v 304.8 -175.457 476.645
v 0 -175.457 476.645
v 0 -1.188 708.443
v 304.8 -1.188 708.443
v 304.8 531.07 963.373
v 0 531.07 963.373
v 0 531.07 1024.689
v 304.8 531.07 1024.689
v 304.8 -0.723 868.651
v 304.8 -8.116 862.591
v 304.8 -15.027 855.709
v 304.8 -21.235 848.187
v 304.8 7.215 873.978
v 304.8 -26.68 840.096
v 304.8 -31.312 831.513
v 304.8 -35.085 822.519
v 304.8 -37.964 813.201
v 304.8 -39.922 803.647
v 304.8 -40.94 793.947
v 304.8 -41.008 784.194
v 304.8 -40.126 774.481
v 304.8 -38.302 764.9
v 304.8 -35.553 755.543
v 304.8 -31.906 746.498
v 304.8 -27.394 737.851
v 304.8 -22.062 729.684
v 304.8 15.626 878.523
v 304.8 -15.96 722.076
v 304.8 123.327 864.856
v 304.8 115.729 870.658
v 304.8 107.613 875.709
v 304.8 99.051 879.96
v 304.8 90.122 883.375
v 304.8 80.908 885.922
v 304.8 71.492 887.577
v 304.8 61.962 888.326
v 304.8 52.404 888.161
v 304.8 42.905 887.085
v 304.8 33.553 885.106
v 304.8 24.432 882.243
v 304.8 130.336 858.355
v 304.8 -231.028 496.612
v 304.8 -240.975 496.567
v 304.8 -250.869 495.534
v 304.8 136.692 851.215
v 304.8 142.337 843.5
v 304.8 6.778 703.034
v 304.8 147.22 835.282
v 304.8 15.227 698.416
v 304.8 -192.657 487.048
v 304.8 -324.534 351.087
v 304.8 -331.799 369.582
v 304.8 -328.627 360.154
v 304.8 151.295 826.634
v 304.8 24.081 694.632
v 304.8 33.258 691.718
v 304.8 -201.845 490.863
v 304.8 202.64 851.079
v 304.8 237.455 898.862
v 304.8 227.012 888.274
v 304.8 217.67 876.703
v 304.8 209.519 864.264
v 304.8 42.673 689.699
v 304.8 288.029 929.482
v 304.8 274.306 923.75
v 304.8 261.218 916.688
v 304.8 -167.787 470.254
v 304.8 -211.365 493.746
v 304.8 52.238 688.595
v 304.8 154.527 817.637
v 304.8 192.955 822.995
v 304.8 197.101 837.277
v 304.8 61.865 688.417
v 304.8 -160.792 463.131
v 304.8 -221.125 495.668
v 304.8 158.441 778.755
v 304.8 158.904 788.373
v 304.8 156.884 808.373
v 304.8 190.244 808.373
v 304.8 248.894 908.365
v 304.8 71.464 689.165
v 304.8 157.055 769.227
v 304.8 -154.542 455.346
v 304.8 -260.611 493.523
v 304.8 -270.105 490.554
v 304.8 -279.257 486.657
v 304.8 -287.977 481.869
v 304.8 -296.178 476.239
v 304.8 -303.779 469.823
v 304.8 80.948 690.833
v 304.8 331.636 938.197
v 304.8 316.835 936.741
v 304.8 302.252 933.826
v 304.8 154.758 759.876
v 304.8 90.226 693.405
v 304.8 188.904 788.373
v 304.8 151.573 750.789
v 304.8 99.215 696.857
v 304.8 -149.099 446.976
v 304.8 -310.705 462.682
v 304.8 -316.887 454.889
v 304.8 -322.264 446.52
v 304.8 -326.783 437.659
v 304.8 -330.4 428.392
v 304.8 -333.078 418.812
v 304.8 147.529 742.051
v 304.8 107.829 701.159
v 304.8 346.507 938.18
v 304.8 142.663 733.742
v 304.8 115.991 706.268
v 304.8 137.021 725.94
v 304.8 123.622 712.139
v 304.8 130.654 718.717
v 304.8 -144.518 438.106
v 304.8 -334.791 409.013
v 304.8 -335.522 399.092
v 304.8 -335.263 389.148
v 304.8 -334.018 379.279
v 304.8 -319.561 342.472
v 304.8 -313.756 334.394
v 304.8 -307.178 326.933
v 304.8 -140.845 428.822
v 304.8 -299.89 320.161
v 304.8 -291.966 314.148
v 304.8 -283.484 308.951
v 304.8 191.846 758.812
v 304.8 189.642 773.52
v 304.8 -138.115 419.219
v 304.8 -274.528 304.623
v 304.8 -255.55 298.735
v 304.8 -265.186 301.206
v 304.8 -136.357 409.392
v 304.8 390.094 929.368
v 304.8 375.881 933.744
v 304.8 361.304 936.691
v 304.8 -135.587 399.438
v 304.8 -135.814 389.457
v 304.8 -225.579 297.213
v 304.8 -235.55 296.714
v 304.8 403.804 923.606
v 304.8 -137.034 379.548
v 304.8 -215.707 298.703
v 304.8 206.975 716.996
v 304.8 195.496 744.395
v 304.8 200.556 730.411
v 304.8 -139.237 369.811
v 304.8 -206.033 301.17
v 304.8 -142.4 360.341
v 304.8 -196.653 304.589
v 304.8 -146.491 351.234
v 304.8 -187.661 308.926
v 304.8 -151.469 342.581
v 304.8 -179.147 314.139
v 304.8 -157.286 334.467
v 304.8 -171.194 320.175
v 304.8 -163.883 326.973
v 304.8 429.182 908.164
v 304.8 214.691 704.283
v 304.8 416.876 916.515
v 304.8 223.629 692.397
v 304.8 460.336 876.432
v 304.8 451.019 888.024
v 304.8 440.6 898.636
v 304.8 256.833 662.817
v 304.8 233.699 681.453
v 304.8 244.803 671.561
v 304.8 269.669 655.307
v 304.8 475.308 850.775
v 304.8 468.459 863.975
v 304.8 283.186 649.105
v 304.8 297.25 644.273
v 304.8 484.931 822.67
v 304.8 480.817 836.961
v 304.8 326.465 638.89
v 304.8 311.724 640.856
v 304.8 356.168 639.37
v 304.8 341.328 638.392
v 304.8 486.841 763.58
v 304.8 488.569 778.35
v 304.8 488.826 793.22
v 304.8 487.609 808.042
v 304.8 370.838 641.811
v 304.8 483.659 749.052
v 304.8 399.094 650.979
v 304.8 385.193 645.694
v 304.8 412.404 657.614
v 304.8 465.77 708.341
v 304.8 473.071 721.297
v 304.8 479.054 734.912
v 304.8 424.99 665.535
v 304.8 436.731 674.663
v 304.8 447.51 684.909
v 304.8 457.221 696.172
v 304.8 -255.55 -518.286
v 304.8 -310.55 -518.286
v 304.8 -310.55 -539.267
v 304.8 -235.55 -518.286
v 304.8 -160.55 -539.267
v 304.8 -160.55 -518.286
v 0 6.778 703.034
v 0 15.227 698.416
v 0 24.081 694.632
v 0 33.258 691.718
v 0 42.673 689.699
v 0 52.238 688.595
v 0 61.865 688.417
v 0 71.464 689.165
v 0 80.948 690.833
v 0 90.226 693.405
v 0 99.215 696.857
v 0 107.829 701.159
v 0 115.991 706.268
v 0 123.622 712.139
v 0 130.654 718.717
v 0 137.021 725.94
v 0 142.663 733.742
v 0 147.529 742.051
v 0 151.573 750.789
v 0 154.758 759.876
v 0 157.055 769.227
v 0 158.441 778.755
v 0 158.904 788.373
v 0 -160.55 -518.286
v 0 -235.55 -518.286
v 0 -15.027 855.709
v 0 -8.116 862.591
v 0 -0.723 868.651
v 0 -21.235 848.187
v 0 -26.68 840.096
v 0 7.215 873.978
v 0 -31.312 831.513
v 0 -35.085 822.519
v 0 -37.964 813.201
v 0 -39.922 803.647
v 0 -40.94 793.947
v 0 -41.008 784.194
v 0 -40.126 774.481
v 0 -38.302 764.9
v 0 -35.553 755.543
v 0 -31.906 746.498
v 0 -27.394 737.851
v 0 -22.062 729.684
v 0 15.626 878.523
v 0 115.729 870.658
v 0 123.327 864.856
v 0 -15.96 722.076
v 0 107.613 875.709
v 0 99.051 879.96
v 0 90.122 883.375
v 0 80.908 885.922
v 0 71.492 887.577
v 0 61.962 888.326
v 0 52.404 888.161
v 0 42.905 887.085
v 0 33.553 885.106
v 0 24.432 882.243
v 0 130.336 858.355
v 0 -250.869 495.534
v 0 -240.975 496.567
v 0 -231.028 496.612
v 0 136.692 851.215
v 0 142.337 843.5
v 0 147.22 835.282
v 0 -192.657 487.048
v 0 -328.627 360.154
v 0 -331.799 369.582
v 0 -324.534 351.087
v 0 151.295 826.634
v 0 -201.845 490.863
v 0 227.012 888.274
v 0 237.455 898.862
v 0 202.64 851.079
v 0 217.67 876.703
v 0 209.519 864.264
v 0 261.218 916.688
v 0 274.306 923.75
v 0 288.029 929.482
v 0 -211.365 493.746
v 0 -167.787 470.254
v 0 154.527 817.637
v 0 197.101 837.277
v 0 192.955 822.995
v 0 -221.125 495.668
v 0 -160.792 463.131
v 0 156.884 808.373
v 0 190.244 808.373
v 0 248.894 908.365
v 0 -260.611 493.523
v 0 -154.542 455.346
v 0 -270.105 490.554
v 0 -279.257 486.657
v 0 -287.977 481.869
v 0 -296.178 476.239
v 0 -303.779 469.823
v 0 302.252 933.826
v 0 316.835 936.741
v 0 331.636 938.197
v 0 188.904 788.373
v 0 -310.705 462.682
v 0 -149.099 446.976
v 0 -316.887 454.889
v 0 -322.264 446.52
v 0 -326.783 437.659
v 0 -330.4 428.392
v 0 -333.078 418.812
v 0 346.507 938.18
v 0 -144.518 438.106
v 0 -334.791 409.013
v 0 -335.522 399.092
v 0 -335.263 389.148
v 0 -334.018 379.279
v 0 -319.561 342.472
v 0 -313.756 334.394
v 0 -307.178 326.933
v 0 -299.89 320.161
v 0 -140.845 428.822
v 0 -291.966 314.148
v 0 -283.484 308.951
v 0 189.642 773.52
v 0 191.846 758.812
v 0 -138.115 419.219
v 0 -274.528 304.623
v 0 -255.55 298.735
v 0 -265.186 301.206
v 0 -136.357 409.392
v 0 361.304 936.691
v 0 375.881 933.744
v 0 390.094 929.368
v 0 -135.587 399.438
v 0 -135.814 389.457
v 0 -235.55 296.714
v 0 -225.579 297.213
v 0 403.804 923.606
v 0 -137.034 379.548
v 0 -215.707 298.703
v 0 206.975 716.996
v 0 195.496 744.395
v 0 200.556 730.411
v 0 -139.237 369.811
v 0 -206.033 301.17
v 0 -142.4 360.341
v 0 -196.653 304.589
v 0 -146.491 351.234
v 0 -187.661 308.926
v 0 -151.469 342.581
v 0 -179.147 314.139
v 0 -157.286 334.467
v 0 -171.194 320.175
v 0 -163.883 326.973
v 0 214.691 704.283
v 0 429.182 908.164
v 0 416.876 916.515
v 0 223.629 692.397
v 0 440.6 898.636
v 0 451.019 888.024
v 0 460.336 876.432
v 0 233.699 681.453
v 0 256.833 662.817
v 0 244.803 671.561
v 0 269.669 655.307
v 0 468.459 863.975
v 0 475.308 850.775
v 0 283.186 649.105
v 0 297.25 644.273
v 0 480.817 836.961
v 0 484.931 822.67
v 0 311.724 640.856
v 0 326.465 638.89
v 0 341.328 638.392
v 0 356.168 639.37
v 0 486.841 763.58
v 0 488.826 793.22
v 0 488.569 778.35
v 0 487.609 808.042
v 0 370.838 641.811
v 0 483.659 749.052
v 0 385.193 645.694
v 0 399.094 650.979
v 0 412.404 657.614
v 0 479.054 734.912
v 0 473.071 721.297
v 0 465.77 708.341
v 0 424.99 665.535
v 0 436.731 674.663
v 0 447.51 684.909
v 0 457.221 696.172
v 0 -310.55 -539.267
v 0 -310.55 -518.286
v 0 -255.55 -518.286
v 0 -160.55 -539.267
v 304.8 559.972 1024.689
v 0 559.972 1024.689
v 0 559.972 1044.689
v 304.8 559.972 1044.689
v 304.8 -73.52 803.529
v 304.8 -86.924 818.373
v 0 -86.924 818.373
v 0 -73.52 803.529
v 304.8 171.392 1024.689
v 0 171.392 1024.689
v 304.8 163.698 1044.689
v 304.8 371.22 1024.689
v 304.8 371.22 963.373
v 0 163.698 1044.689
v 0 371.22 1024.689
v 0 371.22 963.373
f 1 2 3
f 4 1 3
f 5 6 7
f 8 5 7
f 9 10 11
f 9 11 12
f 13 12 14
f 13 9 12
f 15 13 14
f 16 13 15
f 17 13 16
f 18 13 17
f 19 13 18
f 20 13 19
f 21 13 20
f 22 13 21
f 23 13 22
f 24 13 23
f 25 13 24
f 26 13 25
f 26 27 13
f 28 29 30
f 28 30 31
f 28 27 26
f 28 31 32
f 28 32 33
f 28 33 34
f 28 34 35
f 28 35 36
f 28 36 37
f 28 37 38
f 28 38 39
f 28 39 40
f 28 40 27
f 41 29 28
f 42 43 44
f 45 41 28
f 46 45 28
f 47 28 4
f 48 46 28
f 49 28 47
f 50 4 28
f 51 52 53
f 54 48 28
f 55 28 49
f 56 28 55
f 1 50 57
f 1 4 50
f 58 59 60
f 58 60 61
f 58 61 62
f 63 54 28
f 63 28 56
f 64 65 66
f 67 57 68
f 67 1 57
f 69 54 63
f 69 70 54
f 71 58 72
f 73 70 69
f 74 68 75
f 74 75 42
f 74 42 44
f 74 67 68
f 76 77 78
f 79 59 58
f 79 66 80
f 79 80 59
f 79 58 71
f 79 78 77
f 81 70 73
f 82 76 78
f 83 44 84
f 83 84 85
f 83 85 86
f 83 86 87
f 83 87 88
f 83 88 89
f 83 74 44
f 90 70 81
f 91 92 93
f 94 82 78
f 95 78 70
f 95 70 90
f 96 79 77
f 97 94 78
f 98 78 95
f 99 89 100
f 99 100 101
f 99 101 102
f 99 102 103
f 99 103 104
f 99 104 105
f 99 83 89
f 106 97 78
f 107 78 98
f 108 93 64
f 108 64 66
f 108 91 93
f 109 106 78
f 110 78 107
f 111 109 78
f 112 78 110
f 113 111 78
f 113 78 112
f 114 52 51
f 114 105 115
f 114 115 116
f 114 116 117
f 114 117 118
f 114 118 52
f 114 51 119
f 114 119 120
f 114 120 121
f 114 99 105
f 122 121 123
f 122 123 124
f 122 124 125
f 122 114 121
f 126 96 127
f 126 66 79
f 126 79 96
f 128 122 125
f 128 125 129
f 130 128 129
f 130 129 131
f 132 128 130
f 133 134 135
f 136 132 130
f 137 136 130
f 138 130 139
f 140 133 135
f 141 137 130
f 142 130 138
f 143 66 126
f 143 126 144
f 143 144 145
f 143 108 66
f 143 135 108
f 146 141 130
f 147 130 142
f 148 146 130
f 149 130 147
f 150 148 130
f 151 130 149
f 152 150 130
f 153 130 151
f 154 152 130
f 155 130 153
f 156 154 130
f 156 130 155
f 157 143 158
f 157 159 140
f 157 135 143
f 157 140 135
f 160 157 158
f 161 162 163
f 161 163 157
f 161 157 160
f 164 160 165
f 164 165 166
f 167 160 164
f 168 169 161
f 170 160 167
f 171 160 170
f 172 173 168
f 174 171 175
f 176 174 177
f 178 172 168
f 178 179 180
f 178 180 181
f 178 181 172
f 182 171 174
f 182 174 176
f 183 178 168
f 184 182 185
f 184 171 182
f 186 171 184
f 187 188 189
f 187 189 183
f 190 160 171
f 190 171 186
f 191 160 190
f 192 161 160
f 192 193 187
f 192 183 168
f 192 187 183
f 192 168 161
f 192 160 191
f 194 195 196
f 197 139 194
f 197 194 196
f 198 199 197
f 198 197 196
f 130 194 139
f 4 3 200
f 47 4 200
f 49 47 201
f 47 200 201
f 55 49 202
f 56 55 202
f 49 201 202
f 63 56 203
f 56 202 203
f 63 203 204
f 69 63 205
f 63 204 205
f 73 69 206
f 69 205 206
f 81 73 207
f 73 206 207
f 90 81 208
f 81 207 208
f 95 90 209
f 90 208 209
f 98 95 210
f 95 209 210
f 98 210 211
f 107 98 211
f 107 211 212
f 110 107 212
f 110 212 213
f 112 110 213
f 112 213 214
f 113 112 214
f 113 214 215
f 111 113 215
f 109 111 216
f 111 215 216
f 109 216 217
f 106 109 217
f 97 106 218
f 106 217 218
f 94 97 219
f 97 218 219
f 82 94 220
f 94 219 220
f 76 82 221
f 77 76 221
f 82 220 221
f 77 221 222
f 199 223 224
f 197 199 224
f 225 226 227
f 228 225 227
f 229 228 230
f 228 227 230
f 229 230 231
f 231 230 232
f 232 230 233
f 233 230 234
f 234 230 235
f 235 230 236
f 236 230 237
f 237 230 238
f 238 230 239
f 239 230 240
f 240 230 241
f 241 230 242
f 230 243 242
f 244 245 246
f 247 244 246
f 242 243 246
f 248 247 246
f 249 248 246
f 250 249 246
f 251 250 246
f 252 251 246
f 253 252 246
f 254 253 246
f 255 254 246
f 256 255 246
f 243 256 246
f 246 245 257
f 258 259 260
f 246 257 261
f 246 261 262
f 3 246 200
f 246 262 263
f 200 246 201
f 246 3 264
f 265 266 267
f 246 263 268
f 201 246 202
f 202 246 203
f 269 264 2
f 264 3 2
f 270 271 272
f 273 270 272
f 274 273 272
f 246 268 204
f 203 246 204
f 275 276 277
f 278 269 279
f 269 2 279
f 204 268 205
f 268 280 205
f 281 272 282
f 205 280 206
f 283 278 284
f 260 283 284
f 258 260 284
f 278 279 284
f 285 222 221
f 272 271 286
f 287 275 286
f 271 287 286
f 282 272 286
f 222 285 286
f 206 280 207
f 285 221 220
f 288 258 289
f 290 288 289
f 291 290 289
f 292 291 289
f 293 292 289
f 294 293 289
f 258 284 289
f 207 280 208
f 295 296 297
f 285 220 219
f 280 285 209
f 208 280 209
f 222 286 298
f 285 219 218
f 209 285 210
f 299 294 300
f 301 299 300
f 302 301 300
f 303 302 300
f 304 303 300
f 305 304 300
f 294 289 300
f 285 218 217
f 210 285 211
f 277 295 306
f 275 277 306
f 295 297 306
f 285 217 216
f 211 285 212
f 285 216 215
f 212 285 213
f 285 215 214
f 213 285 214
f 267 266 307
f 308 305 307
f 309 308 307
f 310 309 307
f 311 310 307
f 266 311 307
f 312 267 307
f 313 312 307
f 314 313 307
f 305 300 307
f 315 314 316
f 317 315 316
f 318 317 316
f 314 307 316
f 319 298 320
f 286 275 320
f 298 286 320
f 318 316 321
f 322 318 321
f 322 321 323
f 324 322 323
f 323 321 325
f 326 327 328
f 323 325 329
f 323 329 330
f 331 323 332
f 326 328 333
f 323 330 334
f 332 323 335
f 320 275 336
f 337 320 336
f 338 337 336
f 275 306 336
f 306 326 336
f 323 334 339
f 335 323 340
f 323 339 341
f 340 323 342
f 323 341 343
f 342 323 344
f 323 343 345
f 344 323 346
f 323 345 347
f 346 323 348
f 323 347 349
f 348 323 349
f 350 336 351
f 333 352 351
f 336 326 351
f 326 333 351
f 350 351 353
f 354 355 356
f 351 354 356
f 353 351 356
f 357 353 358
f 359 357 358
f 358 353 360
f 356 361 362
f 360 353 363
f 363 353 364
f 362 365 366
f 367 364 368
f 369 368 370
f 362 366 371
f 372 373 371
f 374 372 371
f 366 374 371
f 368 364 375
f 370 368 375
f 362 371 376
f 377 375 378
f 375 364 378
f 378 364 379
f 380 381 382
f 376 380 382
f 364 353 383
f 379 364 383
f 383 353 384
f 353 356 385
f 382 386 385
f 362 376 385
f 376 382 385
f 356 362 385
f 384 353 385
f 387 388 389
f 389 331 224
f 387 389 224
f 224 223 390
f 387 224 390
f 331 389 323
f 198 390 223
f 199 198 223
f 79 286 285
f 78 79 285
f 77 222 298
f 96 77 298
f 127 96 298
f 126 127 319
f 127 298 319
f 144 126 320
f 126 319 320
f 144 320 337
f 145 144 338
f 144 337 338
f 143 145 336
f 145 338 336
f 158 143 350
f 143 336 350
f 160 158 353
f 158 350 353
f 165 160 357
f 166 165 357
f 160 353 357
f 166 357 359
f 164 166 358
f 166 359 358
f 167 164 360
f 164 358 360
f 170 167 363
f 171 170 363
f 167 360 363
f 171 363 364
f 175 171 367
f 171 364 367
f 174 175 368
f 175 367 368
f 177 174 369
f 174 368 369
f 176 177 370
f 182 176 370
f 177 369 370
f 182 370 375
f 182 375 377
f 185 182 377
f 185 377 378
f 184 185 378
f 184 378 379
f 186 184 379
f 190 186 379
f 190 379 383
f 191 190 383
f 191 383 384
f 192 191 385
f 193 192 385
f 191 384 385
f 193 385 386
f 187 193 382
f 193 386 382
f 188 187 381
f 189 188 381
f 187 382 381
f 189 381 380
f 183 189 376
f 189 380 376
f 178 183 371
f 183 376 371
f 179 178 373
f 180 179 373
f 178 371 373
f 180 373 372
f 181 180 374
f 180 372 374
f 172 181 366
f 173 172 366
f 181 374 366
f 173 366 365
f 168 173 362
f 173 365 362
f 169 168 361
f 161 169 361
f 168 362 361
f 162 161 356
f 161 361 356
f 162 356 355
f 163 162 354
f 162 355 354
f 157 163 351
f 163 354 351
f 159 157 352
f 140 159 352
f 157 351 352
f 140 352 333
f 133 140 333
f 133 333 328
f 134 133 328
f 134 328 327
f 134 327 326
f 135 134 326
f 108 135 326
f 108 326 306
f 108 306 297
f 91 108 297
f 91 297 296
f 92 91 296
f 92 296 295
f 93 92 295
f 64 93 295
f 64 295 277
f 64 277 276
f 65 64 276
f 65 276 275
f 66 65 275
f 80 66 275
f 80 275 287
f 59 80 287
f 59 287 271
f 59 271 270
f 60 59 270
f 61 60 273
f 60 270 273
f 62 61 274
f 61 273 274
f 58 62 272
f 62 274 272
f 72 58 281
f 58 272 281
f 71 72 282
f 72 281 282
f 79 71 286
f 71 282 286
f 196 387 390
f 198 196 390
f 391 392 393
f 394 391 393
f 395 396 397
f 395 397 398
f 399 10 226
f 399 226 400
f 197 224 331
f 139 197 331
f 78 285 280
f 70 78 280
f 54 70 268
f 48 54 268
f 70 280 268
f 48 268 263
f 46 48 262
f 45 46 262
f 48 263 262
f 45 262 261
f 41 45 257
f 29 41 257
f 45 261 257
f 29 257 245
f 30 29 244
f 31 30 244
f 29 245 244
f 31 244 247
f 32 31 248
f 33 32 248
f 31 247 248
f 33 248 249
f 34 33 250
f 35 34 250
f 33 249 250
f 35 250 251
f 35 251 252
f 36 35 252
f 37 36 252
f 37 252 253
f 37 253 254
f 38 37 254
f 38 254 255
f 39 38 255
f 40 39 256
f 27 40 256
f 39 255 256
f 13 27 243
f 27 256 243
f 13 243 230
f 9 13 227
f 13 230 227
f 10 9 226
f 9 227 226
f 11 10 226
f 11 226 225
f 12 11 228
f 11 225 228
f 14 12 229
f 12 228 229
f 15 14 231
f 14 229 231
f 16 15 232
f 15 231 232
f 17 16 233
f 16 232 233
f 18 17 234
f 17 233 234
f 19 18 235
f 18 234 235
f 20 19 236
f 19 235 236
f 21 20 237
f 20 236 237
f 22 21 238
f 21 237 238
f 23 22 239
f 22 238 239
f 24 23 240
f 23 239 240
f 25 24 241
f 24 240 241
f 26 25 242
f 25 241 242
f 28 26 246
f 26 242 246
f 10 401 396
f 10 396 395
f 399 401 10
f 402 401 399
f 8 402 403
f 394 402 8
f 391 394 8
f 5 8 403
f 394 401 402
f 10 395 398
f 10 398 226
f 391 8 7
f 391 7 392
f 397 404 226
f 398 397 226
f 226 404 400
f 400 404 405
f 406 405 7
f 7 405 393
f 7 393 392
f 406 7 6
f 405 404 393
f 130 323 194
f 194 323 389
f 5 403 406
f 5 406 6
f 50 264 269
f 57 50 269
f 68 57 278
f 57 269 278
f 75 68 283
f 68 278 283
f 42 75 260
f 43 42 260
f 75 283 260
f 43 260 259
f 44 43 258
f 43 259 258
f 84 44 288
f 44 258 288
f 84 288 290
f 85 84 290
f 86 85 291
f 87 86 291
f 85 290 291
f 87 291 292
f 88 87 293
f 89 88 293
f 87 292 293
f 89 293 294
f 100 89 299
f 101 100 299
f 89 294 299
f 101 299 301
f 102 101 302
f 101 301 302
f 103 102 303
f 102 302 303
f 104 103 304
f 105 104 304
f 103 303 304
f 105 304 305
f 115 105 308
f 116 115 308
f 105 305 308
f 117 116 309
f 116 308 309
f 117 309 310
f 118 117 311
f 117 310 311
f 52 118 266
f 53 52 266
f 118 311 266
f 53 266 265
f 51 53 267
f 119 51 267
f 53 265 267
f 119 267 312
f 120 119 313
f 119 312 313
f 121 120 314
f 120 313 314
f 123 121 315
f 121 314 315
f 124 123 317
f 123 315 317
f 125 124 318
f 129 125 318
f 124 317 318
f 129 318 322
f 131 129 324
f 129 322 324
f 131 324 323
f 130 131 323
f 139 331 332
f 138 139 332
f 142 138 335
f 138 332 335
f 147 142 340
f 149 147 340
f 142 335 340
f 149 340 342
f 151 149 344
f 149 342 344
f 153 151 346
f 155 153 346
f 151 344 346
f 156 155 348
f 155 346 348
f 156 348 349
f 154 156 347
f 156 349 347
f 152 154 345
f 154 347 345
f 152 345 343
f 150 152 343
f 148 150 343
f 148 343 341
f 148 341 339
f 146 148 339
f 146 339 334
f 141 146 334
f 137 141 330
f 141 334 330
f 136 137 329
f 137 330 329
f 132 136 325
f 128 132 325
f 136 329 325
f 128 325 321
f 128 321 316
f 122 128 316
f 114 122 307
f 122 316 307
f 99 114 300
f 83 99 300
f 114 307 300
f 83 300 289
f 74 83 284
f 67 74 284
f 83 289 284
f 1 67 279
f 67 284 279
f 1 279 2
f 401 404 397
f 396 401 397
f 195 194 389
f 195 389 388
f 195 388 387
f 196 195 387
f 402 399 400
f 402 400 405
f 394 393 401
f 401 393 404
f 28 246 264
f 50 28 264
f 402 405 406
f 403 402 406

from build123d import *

# Parameters (mm, degrees)
BOSS_EXTRUDE1_DEPTH   = 304.8
BOSS_EXTRUDE1_2_DEPTH = 304.8


with BuildPart() as part:
    # Sketch1 → Boss-Extrude1 (new body)
    with BuildSketch(Plane(origin=(0, 0, 0), x_dir=(0, 0, -1), z_dir=(1, 0, 0))):
        with BuildLine():
            ThreePointArc((-862.590908506, -8.115598213), (-793.94700601, -40.940083443), (-722.076007022, -15.960257887))
            Line((-722.076007022, -15.960257887), (-487.048137736, -192.65747016))
            ThreePointArc((-487.048137736, -192.65747016), (-428.391943484, -330.400002986), (-298.734565156, -255.550028245))
            Line((-298.734565156, -255.550028245), (518.285845133, -255.550028245))
            Line((518.285845133, -255.550028245), (518.285845133, -310.550028245))
            Line((518.285845133, -310.550028245), (539.267073435, -310.550028245))
            Line((539.267073435, -310.550028245), (539.267073435, -160.550028245))
            Line((539.267073435, -160.550028245), (518.285845133, -160.550028245))
            Line((518.285845133, -160.550028245), (518.285845133, -235.550028245))
            Line((518.285845133, -235.550028245), (-296.714154867, -235.550028245))
            ThreePointArc((-296.714154867, -235.550028245), (-365.036366251, -140.700053504), (-476.644509035, -175.457279243))
            Line((-476.644509035, -175.457279243), (-708.442536122, -1.188307137))
            ThreePointArc((-708.442536122, -1.188307137), (-698.904250811, 103.573923056), (-788.37289029, 158.904441865))
            Line((-788.37289029, 158.904441865), (-788.37289029, 188.904441865))
            ThreePointArc((-788.37289029, 188.904441865), (-778.350493395, 488.569239197), (-808.37289029, 190.243754392))
            Line((-808.37289029, 190.243754392), (-808.37289029, 156.884031576))
            ThreePointArc((-808.37289029, 156.884031576), (-883.375407081, 90.121773641), (-862.590908506, -8.115598213))
        make_face()
    extrude(amount=BOSS_EXTRUDE1_DEPTH)


with BuildPart() as body_2:
    # Sketch1 → Boss-Extrude1 2 (new body)
    with BuildSketch(Plane(origin=(0, 0, 0), x_dir=(0, 0, -1), z_dir=(1, 0, 0))):
        Polygon((-1024.688746425, 171.391607246), (-1024.688746425, 371.220407618), (-963.37289029, 371.220407618), (-963.37289029, 531.070196922), (-1024.688746425, 531.070196922), (-1024.688746425, 559.971929091), (-1044.688746425, 559.971929091), (-1044.688746425, 163.697794457), (-818.373089049, -86.924247939), (-803.529485508, -73.520239811), (-862.590908506, -8.115598213), align=None)
    extrude(amount=BOSS_EXTRUDE1_2_DEPTH)


solid = Compound([part.part, body_2.part])
